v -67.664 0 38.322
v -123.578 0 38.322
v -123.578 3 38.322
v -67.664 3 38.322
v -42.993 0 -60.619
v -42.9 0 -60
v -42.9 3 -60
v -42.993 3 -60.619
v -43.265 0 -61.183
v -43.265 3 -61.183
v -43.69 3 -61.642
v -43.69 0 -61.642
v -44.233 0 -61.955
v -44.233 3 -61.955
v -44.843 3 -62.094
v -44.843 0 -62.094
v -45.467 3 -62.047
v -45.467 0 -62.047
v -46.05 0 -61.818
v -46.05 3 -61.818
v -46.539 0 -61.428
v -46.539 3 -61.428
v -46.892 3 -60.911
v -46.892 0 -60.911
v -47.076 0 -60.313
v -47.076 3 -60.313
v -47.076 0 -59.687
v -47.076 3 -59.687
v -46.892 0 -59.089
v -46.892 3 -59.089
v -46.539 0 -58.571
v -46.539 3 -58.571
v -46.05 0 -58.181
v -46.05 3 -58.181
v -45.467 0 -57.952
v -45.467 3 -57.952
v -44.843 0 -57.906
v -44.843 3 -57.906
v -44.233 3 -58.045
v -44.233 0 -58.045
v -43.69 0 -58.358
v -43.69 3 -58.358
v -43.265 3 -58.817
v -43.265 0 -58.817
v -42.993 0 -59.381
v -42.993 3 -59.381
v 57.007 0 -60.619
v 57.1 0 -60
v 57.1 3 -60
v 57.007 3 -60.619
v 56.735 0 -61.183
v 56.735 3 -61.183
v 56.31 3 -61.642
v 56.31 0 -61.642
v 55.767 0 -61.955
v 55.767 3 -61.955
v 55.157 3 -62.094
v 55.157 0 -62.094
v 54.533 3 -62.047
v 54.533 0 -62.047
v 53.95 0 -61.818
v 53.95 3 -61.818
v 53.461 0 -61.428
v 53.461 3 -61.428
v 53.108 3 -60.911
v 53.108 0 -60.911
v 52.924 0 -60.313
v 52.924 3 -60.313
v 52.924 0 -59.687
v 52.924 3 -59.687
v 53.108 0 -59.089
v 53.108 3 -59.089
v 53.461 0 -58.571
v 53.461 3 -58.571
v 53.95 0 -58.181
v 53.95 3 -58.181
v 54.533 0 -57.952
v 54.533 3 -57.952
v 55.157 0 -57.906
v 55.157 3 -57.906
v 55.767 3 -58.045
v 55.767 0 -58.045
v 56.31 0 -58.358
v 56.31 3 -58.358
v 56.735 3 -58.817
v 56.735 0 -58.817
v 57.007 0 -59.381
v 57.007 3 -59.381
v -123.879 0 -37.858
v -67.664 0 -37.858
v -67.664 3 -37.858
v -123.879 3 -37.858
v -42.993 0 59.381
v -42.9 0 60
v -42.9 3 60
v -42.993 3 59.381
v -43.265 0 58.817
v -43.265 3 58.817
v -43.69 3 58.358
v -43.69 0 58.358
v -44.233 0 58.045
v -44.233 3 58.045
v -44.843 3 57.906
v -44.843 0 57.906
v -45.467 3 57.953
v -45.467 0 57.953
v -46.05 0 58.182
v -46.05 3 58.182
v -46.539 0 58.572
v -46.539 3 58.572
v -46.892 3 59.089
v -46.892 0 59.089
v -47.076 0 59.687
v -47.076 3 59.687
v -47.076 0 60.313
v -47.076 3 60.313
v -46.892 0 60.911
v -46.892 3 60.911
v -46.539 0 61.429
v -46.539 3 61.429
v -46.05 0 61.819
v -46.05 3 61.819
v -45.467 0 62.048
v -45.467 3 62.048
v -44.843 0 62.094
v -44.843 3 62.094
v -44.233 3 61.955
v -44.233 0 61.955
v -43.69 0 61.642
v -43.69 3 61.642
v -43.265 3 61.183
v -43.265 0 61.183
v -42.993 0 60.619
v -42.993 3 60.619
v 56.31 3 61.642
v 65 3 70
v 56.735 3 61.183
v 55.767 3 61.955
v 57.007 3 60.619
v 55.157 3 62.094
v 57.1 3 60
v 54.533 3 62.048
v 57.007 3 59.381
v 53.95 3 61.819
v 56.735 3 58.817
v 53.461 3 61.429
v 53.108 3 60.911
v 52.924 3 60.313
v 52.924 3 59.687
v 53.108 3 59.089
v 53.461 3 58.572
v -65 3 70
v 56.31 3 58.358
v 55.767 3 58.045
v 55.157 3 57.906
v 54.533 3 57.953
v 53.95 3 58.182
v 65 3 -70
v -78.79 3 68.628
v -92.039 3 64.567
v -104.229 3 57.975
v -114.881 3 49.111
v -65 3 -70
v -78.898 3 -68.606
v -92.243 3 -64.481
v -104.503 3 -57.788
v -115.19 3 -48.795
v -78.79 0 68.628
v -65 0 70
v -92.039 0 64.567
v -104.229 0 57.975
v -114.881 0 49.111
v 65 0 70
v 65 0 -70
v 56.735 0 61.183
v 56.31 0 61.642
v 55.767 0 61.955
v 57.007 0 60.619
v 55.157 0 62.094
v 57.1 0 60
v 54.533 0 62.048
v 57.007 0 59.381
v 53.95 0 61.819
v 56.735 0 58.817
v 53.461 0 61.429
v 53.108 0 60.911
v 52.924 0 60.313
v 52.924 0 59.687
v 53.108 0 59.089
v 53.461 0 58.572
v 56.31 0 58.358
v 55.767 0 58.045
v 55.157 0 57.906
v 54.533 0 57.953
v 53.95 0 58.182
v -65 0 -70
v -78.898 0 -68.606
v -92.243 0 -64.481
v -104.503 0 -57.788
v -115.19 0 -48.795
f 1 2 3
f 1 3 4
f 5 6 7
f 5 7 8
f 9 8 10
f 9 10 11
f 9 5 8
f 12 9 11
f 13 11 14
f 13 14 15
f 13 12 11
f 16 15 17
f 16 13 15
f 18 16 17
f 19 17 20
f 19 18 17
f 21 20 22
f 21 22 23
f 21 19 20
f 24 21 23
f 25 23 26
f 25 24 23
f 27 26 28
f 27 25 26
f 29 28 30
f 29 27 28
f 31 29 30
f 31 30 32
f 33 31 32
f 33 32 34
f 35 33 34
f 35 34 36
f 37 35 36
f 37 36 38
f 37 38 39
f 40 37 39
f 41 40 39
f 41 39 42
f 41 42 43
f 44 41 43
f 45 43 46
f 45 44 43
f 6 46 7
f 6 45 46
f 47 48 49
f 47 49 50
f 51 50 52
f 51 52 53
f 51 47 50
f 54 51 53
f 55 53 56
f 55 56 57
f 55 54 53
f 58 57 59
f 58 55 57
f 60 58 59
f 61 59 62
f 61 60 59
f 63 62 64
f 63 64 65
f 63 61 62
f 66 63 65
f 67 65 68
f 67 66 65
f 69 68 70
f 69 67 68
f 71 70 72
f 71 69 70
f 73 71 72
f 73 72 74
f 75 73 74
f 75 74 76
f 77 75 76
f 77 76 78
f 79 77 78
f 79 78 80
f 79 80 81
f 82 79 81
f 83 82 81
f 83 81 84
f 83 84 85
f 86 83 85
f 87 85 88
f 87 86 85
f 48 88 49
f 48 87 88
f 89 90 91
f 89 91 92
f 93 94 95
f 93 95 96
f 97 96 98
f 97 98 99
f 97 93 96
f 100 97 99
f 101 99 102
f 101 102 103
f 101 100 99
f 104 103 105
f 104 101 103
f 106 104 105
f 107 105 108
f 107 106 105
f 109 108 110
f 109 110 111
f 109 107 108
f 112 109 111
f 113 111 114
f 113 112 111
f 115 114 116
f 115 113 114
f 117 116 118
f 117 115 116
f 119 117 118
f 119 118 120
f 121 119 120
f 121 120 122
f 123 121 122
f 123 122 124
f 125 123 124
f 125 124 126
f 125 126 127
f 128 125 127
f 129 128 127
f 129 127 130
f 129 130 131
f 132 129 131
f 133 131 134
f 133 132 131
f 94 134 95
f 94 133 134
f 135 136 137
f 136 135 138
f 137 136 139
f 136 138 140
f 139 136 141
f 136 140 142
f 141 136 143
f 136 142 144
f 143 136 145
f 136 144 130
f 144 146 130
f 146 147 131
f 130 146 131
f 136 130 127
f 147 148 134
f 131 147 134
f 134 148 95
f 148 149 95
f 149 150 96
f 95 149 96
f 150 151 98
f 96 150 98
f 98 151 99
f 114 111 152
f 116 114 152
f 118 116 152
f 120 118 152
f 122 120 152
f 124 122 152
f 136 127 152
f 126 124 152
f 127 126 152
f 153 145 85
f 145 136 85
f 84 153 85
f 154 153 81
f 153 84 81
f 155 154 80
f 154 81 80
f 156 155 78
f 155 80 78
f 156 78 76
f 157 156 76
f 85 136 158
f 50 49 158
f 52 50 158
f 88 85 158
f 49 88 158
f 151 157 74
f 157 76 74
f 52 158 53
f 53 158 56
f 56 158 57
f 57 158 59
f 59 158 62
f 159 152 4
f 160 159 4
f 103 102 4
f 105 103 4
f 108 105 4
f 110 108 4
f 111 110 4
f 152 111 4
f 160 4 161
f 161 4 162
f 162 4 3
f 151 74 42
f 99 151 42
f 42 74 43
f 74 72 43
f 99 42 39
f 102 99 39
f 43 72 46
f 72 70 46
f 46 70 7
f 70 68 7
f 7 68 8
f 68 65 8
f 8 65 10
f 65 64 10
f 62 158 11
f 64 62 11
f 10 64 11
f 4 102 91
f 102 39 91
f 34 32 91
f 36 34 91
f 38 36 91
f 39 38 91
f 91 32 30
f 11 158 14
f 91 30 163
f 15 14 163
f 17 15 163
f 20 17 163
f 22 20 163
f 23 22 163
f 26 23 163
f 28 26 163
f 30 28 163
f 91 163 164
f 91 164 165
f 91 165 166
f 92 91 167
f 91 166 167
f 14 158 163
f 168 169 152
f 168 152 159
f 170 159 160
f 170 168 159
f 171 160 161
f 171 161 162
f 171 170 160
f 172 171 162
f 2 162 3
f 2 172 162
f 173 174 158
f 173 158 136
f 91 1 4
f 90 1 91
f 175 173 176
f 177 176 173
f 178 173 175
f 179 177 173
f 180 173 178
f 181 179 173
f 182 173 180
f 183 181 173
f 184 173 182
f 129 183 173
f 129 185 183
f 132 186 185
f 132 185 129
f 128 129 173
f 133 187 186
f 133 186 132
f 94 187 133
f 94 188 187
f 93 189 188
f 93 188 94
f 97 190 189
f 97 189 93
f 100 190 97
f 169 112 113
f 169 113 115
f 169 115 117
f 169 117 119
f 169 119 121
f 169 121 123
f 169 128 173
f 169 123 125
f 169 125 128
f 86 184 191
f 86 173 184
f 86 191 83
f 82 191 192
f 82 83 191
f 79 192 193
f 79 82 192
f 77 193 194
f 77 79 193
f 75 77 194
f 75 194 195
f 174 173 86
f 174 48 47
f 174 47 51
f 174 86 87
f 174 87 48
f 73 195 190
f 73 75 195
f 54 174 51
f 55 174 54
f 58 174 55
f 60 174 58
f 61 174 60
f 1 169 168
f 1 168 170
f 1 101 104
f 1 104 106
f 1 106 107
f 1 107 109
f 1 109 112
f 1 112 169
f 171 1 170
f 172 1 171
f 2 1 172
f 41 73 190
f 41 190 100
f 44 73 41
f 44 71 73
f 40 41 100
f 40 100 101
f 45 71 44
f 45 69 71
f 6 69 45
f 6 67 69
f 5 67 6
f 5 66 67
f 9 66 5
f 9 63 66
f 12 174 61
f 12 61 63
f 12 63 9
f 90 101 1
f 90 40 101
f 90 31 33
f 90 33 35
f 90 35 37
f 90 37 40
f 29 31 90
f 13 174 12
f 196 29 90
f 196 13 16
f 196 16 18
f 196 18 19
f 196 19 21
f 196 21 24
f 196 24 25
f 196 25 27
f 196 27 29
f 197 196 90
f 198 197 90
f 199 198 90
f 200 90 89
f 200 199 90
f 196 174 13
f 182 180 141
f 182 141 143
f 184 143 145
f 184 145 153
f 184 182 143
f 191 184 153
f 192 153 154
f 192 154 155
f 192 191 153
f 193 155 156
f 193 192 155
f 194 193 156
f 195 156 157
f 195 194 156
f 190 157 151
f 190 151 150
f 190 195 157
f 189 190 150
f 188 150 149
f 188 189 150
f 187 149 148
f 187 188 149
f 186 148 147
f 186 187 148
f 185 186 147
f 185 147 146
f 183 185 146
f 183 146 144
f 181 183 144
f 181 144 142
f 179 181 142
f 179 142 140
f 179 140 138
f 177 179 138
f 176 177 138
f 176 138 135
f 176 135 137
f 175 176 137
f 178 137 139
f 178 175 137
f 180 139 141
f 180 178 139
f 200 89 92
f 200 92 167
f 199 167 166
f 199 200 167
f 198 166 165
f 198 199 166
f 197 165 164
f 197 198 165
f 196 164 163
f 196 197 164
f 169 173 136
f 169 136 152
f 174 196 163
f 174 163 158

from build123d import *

# Parameters (mm, degrees)
SKETCH1_R           = 2.1
BOSS_EXTRUDE1_DEPTH = 3


with BuildPart() as part:
    # Sketch1 → Boss-Extrude1 (new body)
    with BuildSketch(Plane(origin=(0, 0, 0), x_dir=(1, 0, 0), z_dir=(0, 1, 0))):
        with BuildLine():
            Line((65, -70), (-65, -70))
            ThreePointArc((-65, -70), (-98.297426292, -61.573382255), (-123.578147349, -38.32232578))
            Line((-123.578147349, -38.32232578), (-67.663660863, -38.32232578))
            Line((-67.663660863, -38.32232578), (-67.663660863, 37.858201233))
            Line((-67.663660863, 37.858201233), (-123.879169486, 37.858201233))
            ThreePointArc((-123.879169486, 37.858201233), (-98.540467451, 61.441330089), (-65, 70))
            Line((-65, 70), (65, 70))
            Line((65, 70), (65, -70))
        make_face()
        with Locations((-44.999784569, 59.999822317)):
            Circle(SKETCH1_R, mode=Mode.SUBTRACT)
        with Locations((-44.999784569, -60.000177683)):
            Circle(SKETCH1_R, mode=Mode.SUBTRACT)
        with Locations((55.000215431, 59.999822317)):
            Circle(SKETCH1_R, mode=Mode.SUBTRACT)
        with Locations((55.000215431, -60.000177683)):
            Circle(SKETCH1_R, mode=Mode.SUBTRACT)
    extrude(amount=BOSS_EXTRUDE1_DEPTH)


solid = part.part
